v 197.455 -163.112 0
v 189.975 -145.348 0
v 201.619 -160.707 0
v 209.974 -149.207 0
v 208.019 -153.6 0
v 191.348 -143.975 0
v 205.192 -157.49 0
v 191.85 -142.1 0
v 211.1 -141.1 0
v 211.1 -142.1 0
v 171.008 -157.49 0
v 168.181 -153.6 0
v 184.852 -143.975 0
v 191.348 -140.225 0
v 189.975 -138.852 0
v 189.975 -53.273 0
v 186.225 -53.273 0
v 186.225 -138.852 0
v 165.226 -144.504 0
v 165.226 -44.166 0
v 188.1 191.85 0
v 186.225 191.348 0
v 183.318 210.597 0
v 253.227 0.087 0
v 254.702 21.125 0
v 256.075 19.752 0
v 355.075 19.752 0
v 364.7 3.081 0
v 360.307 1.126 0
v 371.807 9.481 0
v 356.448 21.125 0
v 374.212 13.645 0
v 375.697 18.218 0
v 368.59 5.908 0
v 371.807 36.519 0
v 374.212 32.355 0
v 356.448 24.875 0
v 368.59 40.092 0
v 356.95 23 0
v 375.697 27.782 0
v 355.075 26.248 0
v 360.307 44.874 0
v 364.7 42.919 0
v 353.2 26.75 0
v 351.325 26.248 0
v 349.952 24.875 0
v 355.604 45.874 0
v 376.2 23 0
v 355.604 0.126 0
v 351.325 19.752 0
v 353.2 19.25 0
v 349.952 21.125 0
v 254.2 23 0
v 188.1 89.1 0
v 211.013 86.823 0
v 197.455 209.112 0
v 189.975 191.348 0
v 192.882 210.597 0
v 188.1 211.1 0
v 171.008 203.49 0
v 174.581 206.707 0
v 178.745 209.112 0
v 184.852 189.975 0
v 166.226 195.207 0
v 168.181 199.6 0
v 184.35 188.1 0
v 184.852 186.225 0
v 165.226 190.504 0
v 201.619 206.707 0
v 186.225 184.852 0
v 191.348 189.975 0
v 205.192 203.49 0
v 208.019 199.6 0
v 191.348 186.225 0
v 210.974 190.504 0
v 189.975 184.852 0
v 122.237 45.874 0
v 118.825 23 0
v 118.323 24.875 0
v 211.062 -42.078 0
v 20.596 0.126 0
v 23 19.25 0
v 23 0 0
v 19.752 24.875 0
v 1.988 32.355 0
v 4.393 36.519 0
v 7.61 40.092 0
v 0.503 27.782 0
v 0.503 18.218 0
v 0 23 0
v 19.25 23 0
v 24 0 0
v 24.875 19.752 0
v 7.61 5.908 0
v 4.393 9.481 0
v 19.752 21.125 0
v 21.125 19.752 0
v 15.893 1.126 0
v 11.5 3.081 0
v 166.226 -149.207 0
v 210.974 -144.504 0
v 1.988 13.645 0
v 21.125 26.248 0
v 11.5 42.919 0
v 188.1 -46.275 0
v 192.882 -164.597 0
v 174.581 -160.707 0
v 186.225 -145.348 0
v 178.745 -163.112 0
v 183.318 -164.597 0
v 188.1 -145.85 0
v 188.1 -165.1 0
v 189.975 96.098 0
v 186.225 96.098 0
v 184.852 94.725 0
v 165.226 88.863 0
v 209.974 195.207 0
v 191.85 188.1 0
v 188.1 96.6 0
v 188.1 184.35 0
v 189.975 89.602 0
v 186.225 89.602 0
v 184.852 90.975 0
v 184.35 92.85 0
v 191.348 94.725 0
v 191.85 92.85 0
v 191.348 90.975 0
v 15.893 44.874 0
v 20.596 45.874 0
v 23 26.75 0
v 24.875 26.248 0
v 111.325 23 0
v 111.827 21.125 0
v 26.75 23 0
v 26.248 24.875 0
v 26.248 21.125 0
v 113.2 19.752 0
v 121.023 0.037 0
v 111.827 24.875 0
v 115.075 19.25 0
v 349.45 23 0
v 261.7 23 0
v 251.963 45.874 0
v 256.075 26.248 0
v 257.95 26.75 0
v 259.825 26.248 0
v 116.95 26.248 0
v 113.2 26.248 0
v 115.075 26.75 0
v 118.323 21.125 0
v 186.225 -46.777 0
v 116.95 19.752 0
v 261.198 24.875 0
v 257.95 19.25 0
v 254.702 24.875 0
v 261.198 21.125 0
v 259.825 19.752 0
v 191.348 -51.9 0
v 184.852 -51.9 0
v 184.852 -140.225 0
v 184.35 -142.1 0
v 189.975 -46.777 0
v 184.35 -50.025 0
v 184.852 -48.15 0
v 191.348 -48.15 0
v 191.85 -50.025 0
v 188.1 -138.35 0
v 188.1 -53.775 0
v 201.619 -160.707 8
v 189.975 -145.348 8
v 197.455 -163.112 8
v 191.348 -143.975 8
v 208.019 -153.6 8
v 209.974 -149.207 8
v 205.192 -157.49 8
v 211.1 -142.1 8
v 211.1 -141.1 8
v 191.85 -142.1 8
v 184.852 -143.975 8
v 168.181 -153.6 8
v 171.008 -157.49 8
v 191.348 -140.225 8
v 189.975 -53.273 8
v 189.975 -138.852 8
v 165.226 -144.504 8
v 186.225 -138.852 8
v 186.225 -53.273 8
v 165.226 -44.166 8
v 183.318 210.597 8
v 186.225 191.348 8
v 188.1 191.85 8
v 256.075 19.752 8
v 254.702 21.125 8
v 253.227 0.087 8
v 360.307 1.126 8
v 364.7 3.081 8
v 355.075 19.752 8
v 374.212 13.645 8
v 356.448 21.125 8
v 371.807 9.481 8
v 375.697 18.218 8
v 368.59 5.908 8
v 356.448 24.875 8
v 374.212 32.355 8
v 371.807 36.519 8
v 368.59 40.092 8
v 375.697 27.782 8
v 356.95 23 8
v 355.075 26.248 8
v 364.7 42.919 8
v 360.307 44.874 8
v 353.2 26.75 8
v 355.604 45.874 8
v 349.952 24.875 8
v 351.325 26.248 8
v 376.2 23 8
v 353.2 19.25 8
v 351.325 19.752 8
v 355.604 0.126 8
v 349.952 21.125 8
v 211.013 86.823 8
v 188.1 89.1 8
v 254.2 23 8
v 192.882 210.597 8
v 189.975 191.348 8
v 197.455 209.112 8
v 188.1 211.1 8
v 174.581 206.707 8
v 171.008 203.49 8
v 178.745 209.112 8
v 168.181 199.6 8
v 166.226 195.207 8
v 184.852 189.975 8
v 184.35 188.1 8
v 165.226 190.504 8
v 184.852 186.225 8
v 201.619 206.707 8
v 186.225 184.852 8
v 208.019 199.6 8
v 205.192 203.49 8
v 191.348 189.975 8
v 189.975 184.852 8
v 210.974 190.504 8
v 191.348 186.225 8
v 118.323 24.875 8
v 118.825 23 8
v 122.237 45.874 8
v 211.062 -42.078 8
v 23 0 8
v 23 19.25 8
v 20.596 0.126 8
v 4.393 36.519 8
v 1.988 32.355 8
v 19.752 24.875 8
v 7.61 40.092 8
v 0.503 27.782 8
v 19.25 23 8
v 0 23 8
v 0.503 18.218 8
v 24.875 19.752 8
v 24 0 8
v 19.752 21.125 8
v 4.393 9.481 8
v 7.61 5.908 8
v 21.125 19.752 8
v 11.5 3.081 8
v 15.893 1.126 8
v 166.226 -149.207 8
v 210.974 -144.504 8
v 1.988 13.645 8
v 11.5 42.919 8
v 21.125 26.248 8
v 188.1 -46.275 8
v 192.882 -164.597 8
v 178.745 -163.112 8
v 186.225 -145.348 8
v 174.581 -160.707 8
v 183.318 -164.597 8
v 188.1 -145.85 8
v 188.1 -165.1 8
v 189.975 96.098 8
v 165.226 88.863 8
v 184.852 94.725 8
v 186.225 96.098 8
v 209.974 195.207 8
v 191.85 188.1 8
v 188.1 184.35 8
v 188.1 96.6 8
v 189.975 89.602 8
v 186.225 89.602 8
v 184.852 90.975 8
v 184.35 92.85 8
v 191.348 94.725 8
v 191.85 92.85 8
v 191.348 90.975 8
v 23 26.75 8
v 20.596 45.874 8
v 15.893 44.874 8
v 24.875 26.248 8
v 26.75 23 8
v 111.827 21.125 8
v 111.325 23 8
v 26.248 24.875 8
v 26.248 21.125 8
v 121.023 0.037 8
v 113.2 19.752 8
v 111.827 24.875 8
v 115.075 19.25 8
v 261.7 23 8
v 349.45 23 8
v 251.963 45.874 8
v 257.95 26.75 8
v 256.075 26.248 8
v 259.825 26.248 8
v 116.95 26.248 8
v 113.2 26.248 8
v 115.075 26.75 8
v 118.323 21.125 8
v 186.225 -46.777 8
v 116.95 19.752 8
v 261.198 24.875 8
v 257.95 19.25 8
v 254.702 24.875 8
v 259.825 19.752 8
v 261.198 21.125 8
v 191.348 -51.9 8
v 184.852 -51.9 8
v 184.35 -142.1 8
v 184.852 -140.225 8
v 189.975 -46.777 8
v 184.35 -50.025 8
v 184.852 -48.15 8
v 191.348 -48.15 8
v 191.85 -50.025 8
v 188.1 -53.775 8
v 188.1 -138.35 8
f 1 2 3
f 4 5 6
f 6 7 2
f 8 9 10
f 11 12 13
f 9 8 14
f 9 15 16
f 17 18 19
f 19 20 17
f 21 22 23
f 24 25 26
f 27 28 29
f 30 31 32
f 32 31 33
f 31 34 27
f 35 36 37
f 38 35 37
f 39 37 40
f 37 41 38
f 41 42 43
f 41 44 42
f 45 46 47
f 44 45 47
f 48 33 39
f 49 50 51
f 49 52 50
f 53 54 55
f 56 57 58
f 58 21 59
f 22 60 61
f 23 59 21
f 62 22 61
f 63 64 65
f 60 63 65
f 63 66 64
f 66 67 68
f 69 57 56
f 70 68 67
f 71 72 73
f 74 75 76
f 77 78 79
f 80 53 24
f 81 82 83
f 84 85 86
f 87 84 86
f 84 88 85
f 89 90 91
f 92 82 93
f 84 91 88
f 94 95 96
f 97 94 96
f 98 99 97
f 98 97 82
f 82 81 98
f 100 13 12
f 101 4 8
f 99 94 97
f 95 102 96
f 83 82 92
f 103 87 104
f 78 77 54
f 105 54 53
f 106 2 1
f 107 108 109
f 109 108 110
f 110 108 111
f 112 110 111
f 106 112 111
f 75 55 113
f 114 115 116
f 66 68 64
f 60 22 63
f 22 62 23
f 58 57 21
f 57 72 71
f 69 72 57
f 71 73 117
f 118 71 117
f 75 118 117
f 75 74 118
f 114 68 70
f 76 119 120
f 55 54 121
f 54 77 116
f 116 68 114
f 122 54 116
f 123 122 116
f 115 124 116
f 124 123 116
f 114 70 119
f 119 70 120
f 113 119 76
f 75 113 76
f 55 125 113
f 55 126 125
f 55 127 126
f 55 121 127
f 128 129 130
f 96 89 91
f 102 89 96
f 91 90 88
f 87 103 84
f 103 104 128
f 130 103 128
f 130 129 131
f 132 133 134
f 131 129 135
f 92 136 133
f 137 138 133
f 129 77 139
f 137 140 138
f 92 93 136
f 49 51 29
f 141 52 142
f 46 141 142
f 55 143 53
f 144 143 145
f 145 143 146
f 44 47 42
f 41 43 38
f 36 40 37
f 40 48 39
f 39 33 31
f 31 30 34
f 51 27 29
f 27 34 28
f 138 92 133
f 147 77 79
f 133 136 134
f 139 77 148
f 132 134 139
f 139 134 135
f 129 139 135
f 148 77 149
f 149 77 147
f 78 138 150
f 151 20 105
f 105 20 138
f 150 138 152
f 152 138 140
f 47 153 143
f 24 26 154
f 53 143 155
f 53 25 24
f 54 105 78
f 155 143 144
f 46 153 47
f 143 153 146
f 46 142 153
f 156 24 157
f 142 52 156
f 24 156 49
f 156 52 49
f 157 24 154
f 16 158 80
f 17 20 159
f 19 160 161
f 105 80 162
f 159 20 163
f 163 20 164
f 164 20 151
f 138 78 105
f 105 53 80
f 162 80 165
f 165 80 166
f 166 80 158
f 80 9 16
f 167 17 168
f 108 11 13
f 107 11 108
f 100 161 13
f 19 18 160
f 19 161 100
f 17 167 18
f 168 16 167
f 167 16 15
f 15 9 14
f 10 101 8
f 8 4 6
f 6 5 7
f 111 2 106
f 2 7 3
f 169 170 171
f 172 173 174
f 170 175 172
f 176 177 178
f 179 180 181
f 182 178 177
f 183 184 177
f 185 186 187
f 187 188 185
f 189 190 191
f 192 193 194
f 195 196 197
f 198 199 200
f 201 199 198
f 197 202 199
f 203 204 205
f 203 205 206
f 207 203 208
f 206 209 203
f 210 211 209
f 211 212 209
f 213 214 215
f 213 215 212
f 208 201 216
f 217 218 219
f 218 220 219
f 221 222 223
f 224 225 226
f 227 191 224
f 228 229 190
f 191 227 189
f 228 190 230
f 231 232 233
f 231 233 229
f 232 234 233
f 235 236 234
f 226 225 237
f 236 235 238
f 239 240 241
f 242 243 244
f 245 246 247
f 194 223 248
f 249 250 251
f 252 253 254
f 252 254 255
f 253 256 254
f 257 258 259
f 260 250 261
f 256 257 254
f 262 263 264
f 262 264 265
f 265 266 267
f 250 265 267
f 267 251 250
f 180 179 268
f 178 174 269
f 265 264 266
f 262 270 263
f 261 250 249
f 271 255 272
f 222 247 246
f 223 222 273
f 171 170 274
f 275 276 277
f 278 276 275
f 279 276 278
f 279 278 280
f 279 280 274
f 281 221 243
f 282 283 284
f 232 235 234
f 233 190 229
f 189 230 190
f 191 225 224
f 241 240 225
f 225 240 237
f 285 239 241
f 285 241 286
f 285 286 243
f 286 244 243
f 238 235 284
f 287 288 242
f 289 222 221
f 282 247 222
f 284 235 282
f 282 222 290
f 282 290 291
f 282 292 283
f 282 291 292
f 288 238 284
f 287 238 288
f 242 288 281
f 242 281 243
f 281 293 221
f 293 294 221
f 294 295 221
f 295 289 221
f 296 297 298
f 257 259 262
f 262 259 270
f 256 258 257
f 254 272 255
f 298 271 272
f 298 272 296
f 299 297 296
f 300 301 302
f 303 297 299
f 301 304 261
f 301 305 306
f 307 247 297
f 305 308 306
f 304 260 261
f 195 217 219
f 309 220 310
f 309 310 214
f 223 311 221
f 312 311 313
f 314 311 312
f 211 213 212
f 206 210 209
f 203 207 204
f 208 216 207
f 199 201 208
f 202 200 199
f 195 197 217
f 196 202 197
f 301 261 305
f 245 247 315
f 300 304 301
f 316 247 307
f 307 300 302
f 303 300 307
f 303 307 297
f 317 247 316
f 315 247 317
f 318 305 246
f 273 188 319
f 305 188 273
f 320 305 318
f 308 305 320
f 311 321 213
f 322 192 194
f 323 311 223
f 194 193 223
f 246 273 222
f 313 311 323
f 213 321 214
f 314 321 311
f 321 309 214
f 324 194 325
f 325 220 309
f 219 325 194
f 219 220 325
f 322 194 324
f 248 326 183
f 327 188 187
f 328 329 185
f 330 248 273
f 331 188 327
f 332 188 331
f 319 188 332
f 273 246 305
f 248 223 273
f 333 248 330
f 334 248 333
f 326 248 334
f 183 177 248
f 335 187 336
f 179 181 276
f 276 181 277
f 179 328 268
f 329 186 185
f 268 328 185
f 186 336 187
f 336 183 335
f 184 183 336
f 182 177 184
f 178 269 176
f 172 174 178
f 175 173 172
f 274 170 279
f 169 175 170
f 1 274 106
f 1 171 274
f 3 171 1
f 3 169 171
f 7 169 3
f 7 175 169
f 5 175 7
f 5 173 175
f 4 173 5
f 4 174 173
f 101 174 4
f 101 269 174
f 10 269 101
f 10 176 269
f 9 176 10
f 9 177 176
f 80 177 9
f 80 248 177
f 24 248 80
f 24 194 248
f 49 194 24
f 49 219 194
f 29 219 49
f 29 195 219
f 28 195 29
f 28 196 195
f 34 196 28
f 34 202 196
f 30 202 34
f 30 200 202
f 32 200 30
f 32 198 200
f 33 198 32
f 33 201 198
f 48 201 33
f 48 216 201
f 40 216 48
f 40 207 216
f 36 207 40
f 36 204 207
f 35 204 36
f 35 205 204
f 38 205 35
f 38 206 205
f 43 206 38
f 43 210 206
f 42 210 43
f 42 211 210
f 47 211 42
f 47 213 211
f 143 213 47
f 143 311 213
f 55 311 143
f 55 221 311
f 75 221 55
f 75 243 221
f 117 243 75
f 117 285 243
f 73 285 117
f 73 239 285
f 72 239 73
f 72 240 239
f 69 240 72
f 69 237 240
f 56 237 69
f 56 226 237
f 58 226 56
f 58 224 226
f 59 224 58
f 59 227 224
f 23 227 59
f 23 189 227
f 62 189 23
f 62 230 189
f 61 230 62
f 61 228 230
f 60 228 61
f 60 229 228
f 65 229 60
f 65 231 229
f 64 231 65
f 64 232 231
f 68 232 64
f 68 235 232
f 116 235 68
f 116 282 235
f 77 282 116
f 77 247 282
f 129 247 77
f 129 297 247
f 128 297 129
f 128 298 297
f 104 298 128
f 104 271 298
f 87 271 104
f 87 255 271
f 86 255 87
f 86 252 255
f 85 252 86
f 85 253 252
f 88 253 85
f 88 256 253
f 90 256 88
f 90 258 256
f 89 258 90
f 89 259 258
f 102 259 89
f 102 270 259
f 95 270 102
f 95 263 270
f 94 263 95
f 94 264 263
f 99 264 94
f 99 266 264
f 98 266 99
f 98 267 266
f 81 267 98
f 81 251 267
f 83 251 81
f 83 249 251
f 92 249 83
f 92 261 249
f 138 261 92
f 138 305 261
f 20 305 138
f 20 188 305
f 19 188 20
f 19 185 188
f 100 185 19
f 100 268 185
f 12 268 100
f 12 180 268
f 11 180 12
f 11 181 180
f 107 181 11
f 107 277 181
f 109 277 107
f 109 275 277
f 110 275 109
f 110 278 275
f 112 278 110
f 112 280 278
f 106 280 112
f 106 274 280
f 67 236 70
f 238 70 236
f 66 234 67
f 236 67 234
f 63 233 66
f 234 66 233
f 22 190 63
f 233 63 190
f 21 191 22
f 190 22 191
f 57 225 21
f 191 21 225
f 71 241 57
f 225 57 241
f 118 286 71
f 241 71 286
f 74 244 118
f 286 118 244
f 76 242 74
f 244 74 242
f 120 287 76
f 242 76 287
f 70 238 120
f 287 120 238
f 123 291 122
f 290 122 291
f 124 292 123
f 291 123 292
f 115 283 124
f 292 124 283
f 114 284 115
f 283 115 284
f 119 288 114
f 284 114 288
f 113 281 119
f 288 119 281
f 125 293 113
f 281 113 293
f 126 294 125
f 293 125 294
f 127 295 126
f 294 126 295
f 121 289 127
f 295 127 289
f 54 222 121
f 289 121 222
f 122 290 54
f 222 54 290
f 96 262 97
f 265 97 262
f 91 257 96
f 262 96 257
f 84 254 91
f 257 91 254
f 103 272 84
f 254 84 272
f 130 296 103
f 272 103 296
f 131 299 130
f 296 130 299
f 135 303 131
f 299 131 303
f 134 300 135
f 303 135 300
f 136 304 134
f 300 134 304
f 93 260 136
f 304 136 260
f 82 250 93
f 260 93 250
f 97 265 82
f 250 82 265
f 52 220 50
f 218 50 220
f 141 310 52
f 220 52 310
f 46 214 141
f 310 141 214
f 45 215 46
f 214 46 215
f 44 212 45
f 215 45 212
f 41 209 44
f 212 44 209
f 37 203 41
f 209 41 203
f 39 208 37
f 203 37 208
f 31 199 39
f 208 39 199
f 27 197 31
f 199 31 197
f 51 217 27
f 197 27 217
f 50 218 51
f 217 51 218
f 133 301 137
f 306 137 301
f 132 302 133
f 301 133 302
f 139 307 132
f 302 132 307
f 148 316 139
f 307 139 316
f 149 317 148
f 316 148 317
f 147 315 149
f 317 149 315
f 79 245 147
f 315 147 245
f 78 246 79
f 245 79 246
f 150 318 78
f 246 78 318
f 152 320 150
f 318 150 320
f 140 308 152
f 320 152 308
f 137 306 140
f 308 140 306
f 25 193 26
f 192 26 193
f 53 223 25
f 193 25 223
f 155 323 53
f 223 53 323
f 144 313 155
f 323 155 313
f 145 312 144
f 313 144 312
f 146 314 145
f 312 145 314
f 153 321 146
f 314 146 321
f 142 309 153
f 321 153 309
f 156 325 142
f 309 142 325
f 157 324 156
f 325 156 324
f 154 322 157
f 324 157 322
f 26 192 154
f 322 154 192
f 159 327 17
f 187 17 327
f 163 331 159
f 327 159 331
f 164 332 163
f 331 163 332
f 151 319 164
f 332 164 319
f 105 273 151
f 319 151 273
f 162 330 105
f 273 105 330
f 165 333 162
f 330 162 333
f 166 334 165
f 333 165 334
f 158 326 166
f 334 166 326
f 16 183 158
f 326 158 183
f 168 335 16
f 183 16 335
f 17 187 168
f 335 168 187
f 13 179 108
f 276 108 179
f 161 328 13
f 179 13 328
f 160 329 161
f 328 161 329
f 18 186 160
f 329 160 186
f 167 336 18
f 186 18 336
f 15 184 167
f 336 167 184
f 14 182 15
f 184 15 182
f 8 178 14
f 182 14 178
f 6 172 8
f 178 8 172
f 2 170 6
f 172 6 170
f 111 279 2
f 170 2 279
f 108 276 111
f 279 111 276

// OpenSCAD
// Design by: Michael A Fuselier
// TV Mount Adapter
// l=length(x), w=width(y),h=height(z), 
H=8; W=46; L=330.2;


module diamond () {
    square([125.,125]);
}
;

module plate () {

    
hull() {

// main rectangle
translate([.5*W,0,0])
    square([L,W,H]);

// close rounded end of rectangle
translate([.5*W,.5*W,0])
    circle (  d=W);

// far rounded end of rectangle
translate([L+.5*W,.5*W,0])
    circle (  d=W);
}
;

 ;}
;

module holes()
{union () {
// large hole for TV screw   
translate([.5*W,.5*W,0])
    circle (  d=7.5);

// large hole for TV screw   
translate([L+.5*W,.5*W,0])
    circle (  d=7.5);
    
// small hole for TV mount   
translate([(92.075)+.5*W,.5*W,0])
    circle (  d=7.5);    
    
// small hole for TV mount   
// translate([(109.5375)+.5*W,.5*W,0])
//    circle (  d=7.5);   

// small hole for TV mount   
// translate([(217.4875)+.5*W,.5*W,0])
//    circle (  d=7.5);    
    
// small hole for TV mount   
   translate([(234.95)+.5*W,.5*W,0])
      circle (  d=7.5); 
     
}}
linear_extrude(H)
difference() {
union(){
translate ([22+(.5*L),-(.20*L),0]) 
rotate(45, [0,0,1]) diamond();

translate ([0,0,0]) plate () ;
translate ([W+(.5*L),-(.5*L),0]) 
    rotate (90) plate () ; }

translate ([0,0,0]) holes () ;
translate ([W+(.5*L),-(.5*L),0]) 
    rotate (90) holes () ;
}
